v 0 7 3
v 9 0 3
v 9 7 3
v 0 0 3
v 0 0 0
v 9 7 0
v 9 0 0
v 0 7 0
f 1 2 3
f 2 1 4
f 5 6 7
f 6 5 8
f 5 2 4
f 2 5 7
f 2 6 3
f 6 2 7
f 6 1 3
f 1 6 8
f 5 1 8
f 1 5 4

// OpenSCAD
// Generated by SolidPython 1.0.1 on 2020-07-29 00:46:55


cube(size = [9, 7, 3]);
/***********************************************
*********      SolidPython code:      **********
************************************************
 
# import packages: SolidPython
from solid import *
from solid.utils import *
from itertools import chain, combinations, permutations


class Resize:

    def __init__(self, scad_file):
        self.scad_file = scad_file
        #self.scad_file = import_scad(scad_file)
        # cone/cylinder param:
        self.r1 = 0
        self.r2 = 0
        self.h = 0
        # rectangular prism param:
        self.w = 0
        self.l = 0
        # ellipse param:
        self.r = 0

    # import OpenScad code (file name corresponds to shape)


    # classify shape + parameters
    def assign(self, param1, param2, param3):
        if self.scad_file == 'cone.scad':
            self.r1 = param1
            self.r2 = param2
            self.h = param3
        elif self.scad_file == 'cylinder.scad':
            self.r1 = param1
            self.r2 = param2
            self.h = param3
        elif self.scad_file == 'rectangularPrism.scad':
            self.h = param1
            self.l = param2
            self.w = param3
        else:
            self.r = param1
            self.h = param2

    # resize parameters
    def iterate(self):
        x = range(3, 20, 2)
        i = 1
        if self.scad_file == 'cone.scad':
            tempList = list(permutations(x, 2))
            for temp in tempList:
                param1 = temp[0]
                param2 = temp[1]
                filepath = 'produced_scad_files/' + 'cone' + str(param1) + '_' + str(param2) + '_' + '.scad'
                scad_render_to_file(cylinder(h=param1, r1=param2, r2=0), filepath)

        elif self.scad_file == 'cylinder.scad':
            tempList = list(permutations(x, 3))
            for temp in tempList:
                param1 = temp[0]
                param2 = temp[1]
                filepath = 'produced_scad_files/' + 'cylinder' + str(param1) + '_' + str(param2) + '_' + '.scad'
                scad_render_to_file(cylinder(h=param1, r1=param2, r2=param2), filepath)

        elif self.scad_file == 'rectangularPrism.scad':
            tempList = list(permutations(x, 3))
            for temp in tempList:
                param1 = temp[0]
                param2 = temp[1]
                param3 = temp[2]
                filepath = 'produced_scad_files/' + 'rectangularPrism' + str(param1) + '_' + str(param2) + '_' + str(
                    param3) + '.scad'
                scad_render_to_file(cube(size=(param1, param2, param3)), filepath)

        elif self.scad_file == 'ellipse.scad':
            tempList = list(permutations(x, 4))
            for temp in tempList:
                param1 = temp[0]
                param2 = temp[1]
                param3 = temp[2]
                param4 = temp[3]
                filepath = 'produced_scad_files/' + 'ellipse' + str(param1) + '_' + str(param2) + '_' + str(param3) + '_' + str(param4) + '.scad'
                scad_render_to_file(scale([param1, param2, param3])(sphere(r=param4)), filepath)

    def render_to_scadfile(self):
        scad_render_to_file(scad, 'example.scad') 
 
************************************************/
